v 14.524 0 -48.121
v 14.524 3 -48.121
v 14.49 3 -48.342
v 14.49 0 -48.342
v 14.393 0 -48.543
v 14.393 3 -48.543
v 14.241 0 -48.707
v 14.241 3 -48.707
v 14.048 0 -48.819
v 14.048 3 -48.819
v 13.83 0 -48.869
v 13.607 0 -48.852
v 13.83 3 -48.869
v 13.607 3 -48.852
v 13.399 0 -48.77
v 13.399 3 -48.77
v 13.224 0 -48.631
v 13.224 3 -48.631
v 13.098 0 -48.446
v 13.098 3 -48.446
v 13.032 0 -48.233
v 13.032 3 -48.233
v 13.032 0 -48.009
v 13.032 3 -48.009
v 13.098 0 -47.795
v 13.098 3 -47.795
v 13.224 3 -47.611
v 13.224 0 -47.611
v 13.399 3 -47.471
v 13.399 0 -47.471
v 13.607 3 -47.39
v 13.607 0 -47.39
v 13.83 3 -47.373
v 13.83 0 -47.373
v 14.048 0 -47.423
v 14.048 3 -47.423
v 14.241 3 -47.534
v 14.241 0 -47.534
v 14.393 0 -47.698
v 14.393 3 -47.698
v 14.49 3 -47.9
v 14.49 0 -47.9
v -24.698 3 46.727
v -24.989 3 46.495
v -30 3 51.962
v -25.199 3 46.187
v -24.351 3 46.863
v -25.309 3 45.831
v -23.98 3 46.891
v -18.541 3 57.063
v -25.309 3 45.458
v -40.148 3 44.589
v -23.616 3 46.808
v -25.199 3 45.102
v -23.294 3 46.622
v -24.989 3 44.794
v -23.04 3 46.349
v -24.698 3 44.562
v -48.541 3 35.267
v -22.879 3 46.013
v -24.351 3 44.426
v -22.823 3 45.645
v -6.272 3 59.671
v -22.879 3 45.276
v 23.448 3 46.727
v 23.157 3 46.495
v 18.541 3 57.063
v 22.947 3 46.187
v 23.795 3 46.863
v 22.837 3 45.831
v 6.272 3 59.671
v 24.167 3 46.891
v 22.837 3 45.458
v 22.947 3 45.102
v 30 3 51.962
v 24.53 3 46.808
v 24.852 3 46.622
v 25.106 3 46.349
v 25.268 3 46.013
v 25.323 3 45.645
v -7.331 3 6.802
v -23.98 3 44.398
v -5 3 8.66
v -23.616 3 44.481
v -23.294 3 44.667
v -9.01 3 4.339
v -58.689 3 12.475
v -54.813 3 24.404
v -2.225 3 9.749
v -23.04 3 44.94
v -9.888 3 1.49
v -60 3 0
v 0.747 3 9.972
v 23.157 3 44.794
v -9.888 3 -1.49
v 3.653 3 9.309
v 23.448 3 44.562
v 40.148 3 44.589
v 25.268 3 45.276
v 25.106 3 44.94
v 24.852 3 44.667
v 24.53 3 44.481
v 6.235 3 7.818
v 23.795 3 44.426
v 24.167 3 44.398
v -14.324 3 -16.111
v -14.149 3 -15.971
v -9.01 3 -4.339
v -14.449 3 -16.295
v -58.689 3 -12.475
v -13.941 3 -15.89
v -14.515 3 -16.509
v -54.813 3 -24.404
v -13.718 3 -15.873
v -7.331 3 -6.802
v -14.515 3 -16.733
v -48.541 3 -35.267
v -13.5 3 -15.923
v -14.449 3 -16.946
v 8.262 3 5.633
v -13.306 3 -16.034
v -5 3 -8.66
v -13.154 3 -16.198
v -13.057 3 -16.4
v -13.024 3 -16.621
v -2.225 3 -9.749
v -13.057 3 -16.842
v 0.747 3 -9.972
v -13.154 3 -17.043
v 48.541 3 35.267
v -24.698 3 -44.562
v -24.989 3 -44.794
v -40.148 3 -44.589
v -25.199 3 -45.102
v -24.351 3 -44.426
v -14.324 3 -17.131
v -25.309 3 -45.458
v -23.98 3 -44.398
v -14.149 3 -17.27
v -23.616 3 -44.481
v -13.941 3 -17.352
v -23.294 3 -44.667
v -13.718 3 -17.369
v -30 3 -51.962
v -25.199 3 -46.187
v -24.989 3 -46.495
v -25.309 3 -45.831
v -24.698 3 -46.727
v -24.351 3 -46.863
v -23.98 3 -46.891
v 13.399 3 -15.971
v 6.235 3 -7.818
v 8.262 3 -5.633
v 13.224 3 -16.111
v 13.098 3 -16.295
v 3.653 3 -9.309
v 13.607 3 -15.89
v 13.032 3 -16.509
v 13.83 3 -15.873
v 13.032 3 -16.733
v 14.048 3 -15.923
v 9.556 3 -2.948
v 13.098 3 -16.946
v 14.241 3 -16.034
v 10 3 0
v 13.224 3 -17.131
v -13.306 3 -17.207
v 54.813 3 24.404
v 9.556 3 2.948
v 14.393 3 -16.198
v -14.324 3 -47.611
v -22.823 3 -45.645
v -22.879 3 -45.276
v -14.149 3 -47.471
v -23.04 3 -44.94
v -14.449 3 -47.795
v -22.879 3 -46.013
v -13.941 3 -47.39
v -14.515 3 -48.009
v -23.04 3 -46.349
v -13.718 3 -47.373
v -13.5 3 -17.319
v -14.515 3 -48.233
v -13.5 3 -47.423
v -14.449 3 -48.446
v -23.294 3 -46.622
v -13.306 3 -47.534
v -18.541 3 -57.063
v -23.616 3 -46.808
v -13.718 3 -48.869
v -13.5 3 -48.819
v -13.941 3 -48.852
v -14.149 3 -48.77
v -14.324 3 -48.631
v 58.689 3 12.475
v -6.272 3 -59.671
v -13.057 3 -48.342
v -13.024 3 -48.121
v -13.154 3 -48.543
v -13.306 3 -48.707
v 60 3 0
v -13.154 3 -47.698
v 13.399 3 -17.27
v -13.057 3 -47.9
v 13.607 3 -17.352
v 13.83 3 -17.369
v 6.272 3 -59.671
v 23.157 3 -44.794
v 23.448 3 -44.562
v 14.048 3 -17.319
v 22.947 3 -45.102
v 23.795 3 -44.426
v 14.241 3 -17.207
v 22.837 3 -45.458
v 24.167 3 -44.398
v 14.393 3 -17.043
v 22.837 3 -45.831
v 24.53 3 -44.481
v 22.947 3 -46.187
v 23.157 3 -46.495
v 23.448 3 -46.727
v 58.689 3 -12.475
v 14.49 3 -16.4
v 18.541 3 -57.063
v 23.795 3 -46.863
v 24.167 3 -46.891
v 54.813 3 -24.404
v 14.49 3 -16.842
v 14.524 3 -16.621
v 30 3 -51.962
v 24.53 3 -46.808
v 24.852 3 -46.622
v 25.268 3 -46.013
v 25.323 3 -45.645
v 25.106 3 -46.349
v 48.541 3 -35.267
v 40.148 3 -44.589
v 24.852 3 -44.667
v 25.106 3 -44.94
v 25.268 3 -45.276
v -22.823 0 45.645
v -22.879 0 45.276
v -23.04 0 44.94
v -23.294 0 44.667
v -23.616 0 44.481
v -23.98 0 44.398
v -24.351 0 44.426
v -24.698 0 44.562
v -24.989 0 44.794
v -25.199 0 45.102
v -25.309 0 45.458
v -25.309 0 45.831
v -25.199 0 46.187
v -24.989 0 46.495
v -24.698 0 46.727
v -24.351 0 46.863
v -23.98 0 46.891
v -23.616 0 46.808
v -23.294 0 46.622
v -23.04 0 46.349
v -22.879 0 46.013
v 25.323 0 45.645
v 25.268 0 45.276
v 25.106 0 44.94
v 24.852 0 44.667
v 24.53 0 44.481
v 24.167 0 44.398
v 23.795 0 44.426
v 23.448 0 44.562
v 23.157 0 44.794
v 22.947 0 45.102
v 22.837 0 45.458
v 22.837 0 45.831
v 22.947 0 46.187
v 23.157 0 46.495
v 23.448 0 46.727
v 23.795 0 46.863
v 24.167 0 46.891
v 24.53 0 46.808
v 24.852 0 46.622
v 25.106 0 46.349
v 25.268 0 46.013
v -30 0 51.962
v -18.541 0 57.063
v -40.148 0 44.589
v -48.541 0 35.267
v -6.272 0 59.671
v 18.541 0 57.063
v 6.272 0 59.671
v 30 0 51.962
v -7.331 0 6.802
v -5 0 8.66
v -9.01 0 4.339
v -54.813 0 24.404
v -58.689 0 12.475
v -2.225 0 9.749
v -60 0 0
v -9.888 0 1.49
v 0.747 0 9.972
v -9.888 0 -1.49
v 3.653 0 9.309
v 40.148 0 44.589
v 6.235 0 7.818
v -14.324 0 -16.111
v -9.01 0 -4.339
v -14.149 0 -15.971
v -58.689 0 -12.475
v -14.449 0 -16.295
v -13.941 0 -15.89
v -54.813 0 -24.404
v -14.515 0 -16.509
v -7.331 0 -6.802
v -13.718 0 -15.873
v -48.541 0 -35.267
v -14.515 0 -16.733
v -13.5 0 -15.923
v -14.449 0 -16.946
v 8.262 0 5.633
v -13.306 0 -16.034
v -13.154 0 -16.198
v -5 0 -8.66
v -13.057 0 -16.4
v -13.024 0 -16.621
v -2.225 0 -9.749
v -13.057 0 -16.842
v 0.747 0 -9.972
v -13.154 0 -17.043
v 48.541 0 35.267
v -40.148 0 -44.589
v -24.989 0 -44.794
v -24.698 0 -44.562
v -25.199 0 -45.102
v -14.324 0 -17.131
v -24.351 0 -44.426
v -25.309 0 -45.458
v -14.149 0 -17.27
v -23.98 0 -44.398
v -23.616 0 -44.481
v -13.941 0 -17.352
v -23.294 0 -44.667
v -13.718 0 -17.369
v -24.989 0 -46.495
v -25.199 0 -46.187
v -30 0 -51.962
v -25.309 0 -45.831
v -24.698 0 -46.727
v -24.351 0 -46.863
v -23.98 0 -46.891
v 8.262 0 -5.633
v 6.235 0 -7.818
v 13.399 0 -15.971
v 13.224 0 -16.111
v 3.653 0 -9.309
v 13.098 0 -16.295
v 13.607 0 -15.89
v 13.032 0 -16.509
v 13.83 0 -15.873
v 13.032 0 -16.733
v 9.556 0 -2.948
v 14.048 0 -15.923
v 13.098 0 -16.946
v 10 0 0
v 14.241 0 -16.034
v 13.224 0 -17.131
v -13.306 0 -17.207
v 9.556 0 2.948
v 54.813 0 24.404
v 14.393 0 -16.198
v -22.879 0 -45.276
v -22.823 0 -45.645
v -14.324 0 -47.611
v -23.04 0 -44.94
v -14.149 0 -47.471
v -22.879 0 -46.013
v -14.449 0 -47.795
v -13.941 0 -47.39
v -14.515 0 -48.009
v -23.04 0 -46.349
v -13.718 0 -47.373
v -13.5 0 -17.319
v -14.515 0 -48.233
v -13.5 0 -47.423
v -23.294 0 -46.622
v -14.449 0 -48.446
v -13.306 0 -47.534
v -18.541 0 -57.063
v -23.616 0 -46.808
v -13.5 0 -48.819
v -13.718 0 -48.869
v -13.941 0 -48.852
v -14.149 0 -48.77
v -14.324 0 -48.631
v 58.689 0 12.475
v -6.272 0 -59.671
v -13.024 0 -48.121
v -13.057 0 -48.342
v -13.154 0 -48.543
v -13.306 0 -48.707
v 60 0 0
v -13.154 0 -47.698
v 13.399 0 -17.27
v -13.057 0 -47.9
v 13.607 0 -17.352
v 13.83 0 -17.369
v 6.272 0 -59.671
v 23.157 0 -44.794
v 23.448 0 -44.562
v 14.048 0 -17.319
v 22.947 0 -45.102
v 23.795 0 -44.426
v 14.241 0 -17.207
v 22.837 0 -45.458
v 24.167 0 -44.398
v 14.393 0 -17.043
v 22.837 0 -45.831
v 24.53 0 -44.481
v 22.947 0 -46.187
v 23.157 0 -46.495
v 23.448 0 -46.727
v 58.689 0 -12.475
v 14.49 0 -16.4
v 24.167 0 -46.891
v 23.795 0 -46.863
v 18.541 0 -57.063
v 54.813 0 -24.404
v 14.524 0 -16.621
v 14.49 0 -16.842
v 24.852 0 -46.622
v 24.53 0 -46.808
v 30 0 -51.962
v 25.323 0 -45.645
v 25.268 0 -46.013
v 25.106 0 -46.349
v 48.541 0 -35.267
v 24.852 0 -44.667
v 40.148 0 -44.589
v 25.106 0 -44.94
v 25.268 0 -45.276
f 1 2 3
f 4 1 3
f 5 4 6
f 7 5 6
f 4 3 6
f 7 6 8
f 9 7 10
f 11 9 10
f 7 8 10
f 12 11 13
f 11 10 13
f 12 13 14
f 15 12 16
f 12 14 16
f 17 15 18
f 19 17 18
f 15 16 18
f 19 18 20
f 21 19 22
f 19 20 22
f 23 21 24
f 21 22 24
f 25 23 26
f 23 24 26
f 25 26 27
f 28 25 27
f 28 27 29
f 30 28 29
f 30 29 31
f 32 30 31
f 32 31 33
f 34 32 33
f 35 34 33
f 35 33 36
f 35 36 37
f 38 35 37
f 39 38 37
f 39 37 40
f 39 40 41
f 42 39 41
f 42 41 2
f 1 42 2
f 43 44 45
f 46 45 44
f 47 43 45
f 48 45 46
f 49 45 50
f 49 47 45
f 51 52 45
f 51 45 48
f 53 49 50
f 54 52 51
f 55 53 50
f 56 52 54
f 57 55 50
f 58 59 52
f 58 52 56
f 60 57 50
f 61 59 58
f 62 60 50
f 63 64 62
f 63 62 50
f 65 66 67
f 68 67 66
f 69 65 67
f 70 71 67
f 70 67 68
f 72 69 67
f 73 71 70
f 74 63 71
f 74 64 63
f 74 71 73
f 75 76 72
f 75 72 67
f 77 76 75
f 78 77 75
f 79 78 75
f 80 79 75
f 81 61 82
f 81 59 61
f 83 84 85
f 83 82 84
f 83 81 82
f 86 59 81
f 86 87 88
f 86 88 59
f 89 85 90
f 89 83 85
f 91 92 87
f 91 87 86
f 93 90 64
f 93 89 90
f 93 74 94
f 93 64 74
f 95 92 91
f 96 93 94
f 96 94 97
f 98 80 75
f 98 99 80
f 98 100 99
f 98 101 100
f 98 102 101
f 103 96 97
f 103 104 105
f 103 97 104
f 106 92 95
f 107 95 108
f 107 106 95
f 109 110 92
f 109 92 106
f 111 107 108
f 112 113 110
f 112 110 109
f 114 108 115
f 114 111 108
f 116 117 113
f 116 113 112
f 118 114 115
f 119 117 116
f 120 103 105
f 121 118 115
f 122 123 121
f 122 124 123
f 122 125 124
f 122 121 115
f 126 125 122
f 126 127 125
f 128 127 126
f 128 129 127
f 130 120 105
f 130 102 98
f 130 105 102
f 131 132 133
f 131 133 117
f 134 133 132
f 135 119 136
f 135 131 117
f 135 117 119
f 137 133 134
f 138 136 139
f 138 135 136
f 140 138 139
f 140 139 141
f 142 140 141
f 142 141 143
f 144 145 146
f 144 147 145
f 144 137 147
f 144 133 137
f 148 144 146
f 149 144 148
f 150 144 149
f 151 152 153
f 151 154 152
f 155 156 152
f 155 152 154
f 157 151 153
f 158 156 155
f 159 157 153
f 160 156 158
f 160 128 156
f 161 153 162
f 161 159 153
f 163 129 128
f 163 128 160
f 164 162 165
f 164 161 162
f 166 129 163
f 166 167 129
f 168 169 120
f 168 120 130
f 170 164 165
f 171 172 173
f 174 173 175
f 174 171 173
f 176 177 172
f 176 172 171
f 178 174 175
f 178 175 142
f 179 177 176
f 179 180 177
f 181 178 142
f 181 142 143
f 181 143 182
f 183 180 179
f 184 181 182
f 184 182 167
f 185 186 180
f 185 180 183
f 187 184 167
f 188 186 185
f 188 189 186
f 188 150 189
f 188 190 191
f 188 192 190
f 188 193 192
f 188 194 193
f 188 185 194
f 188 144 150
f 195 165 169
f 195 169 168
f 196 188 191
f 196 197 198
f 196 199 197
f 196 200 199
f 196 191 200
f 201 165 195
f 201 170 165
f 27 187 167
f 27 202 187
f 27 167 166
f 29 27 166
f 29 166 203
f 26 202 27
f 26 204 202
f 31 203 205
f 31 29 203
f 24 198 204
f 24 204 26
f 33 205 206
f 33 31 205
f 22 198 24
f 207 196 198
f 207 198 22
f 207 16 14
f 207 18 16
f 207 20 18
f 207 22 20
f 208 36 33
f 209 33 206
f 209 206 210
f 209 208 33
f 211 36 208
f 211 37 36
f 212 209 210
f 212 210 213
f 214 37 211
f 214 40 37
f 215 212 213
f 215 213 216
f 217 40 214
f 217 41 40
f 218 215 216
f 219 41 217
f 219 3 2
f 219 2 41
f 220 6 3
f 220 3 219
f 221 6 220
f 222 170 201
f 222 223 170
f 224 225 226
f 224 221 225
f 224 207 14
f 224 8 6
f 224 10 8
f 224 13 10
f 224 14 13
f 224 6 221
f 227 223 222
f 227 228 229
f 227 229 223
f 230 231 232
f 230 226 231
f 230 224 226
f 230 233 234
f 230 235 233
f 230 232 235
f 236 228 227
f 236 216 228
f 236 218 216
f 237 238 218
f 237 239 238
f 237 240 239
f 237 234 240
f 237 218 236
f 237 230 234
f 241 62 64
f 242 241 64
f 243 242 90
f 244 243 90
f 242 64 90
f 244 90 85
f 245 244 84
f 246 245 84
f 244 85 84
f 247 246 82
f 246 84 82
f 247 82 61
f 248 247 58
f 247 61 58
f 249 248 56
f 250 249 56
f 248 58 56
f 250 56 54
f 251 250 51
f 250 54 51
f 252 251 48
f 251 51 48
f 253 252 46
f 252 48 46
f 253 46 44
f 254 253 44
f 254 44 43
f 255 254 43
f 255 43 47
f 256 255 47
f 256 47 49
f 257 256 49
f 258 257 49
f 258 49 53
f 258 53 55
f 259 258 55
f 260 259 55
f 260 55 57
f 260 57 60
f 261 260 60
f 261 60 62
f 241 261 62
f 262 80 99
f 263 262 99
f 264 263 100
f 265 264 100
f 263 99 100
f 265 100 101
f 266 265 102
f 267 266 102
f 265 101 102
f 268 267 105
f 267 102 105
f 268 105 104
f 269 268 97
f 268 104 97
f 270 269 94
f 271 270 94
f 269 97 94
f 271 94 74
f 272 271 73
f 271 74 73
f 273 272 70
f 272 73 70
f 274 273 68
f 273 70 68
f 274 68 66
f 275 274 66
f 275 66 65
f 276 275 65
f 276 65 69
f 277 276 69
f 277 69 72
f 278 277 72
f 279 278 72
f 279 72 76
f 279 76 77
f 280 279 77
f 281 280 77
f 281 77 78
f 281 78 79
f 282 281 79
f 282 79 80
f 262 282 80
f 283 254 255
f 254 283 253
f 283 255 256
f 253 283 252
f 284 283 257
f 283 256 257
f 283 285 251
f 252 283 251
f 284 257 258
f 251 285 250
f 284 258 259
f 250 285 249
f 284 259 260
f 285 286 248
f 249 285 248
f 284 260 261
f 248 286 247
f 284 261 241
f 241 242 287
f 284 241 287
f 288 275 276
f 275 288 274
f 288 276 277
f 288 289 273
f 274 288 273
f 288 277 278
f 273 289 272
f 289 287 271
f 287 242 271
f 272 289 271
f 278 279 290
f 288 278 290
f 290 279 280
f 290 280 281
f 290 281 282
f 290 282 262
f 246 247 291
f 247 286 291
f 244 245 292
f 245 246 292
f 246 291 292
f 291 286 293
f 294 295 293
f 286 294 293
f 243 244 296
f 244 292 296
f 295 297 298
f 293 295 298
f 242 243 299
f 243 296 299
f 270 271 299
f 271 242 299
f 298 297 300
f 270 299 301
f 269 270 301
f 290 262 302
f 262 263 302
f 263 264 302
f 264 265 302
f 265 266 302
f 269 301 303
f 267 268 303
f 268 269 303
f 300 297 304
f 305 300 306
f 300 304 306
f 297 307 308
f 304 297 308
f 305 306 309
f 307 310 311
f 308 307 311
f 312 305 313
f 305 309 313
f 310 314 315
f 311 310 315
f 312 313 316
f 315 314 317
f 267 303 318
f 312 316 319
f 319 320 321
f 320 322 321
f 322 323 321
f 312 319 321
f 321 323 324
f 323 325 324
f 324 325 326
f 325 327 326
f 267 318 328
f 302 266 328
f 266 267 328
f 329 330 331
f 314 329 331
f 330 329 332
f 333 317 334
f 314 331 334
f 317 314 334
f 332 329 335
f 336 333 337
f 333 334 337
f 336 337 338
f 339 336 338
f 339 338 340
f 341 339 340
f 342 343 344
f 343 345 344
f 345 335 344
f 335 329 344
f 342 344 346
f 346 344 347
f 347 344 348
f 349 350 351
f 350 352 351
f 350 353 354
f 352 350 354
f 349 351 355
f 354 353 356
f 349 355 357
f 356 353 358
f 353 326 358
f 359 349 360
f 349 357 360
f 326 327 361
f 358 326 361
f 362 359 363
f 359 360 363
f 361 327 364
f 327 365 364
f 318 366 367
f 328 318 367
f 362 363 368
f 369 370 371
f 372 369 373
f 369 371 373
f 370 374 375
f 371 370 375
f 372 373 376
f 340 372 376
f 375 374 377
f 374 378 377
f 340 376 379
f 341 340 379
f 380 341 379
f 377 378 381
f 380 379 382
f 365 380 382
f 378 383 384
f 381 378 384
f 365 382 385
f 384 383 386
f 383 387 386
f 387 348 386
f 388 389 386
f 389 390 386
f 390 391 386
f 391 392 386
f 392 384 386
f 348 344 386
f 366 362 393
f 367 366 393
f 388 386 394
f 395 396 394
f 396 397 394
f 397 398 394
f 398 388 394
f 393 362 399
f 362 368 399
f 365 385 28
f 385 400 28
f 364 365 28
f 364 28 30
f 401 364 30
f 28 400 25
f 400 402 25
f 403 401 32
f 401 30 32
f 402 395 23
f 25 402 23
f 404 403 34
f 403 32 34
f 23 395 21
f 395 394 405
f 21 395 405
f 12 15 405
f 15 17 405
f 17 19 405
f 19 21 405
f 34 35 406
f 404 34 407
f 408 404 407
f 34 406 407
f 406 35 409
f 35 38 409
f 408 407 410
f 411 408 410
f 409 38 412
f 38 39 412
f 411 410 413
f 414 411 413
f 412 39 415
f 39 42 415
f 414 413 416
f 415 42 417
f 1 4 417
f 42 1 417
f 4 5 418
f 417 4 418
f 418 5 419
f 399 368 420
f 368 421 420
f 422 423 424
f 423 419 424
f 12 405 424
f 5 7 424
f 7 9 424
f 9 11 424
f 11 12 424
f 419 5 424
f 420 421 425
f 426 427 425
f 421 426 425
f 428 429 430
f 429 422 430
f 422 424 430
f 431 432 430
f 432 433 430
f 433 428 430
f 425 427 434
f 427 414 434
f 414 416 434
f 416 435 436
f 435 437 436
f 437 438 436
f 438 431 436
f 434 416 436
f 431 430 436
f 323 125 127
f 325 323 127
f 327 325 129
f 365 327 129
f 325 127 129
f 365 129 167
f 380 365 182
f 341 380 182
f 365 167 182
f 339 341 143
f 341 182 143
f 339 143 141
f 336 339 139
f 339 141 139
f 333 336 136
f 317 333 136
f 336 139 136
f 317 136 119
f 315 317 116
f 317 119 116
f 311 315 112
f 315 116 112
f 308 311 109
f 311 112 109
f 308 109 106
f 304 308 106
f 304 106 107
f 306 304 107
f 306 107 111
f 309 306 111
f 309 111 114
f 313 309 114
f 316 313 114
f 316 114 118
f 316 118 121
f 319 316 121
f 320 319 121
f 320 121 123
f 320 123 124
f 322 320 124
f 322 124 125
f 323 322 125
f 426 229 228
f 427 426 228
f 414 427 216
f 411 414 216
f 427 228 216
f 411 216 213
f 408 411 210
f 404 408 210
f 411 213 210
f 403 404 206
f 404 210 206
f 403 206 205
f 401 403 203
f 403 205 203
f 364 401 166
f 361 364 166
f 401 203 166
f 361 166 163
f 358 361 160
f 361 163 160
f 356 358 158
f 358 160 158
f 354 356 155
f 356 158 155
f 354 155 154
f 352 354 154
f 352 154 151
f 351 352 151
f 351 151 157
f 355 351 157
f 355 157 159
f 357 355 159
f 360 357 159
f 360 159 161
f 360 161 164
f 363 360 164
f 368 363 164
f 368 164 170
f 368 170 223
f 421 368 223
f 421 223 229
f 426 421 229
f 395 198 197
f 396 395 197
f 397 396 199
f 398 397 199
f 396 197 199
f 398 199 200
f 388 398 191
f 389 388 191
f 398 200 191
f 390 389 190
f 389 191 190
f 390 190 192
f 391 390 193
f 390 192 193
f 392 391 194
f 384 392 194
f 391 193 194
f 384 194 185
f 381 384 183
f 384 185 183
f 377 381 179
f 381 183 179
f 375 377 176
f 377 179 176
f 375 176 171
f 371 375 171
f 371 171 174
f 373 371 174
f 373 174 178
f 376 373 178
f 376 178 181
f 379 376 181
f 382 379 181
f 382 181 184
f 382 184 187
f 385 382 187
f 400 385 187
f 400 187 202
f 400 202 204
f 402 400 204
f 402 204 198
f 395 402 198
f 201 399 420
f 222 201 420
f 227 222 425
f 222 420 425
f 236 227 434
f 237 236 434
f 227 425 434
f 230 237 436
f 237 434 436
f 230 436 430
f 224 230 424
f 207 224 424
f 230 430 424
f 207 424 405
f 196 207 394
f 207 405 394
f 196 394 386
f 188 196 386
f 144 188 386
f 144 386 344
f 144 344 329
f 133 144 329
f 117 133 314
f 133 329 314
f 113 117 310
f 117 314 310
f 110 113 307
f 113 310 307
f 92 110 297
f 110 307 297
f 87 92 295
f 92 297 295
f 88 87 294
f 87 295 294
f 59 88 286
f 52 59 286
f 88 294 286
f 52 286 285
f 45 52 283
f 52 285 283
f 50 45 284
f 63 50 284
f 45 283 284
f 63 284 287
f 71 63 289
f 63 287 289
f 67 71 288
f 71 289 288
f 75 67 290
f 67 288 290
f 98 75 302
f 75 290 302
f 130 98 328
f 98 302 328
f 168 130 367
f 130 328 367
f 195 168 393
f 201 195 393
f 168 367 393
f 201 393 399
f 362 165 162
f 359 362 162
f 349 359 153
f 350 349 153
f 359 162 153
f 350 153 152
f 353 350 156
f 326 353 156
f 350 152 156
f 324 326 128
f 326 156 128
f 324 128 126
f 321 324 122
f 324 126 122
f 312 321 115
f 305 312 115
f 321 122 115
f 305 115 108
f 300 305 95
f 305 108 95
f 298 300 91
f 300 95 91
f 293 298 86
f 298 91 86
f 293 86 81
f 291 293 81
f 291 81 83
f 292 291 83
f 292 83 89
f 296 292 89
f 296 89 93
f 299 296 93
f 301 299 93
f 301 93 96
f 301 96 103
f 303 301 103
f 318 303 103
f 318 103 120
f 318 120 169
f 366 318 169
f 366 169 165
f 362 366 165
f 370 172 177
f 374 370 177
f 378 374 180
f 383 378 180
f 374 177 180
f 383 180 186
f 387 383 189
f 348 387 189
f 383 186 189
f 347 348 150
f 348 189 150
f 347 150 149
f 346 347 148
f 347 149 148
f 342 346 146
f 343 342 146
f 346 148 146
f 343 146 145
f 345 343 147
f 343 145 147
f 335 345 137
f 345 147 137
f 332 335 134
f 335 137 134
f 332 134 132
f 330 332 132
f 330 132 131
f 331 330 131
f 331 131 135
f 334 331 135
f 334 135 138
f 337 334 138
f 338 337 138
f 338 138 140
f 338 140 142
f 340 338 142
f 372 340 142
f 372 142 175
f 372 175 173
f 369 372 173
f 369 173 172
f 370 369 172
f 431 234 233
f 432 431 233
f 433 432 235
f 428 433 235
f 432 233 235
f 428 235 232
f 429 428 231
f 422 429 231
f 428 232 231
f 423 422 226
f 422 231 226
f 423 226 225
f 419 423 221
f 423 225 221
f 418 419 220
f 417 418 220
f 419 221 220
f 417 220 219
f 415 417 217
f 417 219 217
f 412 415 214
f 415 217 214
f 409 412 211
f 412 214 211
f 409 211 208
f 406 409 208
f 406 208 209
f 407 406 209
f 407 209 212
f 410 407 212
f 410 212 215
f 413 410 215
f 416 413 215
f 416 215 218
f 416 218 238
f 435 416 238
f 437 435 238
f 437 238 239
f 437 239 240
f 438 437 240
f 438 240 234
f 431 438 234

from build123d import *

# Parameters (mm, degrees)
SKETCH1_R           = 60
BOSS_EXTRUDE1_DEPTH = 3
SKETCH2_R           = 1.25
CUT_EXTRUDE1_DEPTH  = 4
SKETCH5_R           = 10
CUT_EXTRUDE2_DEPTH  = 4
SKETCH6_R           = 0.75
CUT_EXTRUDE3_DEPTH  = 4


with BuildPart() as part:
    # Sketch1 → Boss-Extrude1 (new body)
    with BuildSketch(Plane(origin=(0, 0, 0), x_dir=(1, 0, 0), z_dir=(0, 1, 0))):
        Circle(SKETCH1_R)
    extrude(amount=BOSS_EXTRUDE1_DEPTH)

    # Sketch2 → Cut-Extrude1 (cut, through all)
    with BuildSketch(Plane(origin=(0, 3, 0), x_dir=(1, 0, 0), z_dir=(0, 1, 0))):
        with Locations((-24.073102507, 45.644631202)):
            Circle(SKETCH2_R)
        with Locations((24.073102507, 45.644631202)):
            Circle(SKETCH2_R)
        with Locations((24.073102507, -45.644631202)):
            Circle(SKETCH2_R)
        with Locations((-24.073102507, -45.644631202)):
            Circle(SKETCH2_R)
    extrude(amount=-CUT_EXTRUDE1_DEPTH, mode=Mode.SUBTRACT)

    # Sketch5 → Cut-Extrude2 (cut, through all)
    with BuildSketch(Plane(origin=(0, 3, 0), x_dir=(1, 0, 0), z_dir=(0, 1, 0))):
        Circle(SKETCH5_R)
    extrude(amount=-CUT_EXTRUDE2_DEPTH, mode=Mode.SUBTRACT)

    # Sketch6 → Cut-Extrude3 (cut, through all)
    with BuildSketch(Plane(origin=(0, 3, 0), x_dir=(1, 0, 0), z_dir=(0, 1, 0))):
        with Locations((13.773714056, 48.12077632)):
            Circle(SKETCH6_R)
        with Locations((13.773714056, 16.62077632)):
            Circle(SKETCH6_R)
        with Locations((-13.773714056, 16.62077632)):
            Circle(SKETCH6_R)
        with Locations((-13.773714056, 48.12077632)):
            Circle(SKETCH6_R)
    extrude(amount=-CUT_EXTRUDE3_DEPTH, mode=Mode.SUBTRACT)


solid = part.part
